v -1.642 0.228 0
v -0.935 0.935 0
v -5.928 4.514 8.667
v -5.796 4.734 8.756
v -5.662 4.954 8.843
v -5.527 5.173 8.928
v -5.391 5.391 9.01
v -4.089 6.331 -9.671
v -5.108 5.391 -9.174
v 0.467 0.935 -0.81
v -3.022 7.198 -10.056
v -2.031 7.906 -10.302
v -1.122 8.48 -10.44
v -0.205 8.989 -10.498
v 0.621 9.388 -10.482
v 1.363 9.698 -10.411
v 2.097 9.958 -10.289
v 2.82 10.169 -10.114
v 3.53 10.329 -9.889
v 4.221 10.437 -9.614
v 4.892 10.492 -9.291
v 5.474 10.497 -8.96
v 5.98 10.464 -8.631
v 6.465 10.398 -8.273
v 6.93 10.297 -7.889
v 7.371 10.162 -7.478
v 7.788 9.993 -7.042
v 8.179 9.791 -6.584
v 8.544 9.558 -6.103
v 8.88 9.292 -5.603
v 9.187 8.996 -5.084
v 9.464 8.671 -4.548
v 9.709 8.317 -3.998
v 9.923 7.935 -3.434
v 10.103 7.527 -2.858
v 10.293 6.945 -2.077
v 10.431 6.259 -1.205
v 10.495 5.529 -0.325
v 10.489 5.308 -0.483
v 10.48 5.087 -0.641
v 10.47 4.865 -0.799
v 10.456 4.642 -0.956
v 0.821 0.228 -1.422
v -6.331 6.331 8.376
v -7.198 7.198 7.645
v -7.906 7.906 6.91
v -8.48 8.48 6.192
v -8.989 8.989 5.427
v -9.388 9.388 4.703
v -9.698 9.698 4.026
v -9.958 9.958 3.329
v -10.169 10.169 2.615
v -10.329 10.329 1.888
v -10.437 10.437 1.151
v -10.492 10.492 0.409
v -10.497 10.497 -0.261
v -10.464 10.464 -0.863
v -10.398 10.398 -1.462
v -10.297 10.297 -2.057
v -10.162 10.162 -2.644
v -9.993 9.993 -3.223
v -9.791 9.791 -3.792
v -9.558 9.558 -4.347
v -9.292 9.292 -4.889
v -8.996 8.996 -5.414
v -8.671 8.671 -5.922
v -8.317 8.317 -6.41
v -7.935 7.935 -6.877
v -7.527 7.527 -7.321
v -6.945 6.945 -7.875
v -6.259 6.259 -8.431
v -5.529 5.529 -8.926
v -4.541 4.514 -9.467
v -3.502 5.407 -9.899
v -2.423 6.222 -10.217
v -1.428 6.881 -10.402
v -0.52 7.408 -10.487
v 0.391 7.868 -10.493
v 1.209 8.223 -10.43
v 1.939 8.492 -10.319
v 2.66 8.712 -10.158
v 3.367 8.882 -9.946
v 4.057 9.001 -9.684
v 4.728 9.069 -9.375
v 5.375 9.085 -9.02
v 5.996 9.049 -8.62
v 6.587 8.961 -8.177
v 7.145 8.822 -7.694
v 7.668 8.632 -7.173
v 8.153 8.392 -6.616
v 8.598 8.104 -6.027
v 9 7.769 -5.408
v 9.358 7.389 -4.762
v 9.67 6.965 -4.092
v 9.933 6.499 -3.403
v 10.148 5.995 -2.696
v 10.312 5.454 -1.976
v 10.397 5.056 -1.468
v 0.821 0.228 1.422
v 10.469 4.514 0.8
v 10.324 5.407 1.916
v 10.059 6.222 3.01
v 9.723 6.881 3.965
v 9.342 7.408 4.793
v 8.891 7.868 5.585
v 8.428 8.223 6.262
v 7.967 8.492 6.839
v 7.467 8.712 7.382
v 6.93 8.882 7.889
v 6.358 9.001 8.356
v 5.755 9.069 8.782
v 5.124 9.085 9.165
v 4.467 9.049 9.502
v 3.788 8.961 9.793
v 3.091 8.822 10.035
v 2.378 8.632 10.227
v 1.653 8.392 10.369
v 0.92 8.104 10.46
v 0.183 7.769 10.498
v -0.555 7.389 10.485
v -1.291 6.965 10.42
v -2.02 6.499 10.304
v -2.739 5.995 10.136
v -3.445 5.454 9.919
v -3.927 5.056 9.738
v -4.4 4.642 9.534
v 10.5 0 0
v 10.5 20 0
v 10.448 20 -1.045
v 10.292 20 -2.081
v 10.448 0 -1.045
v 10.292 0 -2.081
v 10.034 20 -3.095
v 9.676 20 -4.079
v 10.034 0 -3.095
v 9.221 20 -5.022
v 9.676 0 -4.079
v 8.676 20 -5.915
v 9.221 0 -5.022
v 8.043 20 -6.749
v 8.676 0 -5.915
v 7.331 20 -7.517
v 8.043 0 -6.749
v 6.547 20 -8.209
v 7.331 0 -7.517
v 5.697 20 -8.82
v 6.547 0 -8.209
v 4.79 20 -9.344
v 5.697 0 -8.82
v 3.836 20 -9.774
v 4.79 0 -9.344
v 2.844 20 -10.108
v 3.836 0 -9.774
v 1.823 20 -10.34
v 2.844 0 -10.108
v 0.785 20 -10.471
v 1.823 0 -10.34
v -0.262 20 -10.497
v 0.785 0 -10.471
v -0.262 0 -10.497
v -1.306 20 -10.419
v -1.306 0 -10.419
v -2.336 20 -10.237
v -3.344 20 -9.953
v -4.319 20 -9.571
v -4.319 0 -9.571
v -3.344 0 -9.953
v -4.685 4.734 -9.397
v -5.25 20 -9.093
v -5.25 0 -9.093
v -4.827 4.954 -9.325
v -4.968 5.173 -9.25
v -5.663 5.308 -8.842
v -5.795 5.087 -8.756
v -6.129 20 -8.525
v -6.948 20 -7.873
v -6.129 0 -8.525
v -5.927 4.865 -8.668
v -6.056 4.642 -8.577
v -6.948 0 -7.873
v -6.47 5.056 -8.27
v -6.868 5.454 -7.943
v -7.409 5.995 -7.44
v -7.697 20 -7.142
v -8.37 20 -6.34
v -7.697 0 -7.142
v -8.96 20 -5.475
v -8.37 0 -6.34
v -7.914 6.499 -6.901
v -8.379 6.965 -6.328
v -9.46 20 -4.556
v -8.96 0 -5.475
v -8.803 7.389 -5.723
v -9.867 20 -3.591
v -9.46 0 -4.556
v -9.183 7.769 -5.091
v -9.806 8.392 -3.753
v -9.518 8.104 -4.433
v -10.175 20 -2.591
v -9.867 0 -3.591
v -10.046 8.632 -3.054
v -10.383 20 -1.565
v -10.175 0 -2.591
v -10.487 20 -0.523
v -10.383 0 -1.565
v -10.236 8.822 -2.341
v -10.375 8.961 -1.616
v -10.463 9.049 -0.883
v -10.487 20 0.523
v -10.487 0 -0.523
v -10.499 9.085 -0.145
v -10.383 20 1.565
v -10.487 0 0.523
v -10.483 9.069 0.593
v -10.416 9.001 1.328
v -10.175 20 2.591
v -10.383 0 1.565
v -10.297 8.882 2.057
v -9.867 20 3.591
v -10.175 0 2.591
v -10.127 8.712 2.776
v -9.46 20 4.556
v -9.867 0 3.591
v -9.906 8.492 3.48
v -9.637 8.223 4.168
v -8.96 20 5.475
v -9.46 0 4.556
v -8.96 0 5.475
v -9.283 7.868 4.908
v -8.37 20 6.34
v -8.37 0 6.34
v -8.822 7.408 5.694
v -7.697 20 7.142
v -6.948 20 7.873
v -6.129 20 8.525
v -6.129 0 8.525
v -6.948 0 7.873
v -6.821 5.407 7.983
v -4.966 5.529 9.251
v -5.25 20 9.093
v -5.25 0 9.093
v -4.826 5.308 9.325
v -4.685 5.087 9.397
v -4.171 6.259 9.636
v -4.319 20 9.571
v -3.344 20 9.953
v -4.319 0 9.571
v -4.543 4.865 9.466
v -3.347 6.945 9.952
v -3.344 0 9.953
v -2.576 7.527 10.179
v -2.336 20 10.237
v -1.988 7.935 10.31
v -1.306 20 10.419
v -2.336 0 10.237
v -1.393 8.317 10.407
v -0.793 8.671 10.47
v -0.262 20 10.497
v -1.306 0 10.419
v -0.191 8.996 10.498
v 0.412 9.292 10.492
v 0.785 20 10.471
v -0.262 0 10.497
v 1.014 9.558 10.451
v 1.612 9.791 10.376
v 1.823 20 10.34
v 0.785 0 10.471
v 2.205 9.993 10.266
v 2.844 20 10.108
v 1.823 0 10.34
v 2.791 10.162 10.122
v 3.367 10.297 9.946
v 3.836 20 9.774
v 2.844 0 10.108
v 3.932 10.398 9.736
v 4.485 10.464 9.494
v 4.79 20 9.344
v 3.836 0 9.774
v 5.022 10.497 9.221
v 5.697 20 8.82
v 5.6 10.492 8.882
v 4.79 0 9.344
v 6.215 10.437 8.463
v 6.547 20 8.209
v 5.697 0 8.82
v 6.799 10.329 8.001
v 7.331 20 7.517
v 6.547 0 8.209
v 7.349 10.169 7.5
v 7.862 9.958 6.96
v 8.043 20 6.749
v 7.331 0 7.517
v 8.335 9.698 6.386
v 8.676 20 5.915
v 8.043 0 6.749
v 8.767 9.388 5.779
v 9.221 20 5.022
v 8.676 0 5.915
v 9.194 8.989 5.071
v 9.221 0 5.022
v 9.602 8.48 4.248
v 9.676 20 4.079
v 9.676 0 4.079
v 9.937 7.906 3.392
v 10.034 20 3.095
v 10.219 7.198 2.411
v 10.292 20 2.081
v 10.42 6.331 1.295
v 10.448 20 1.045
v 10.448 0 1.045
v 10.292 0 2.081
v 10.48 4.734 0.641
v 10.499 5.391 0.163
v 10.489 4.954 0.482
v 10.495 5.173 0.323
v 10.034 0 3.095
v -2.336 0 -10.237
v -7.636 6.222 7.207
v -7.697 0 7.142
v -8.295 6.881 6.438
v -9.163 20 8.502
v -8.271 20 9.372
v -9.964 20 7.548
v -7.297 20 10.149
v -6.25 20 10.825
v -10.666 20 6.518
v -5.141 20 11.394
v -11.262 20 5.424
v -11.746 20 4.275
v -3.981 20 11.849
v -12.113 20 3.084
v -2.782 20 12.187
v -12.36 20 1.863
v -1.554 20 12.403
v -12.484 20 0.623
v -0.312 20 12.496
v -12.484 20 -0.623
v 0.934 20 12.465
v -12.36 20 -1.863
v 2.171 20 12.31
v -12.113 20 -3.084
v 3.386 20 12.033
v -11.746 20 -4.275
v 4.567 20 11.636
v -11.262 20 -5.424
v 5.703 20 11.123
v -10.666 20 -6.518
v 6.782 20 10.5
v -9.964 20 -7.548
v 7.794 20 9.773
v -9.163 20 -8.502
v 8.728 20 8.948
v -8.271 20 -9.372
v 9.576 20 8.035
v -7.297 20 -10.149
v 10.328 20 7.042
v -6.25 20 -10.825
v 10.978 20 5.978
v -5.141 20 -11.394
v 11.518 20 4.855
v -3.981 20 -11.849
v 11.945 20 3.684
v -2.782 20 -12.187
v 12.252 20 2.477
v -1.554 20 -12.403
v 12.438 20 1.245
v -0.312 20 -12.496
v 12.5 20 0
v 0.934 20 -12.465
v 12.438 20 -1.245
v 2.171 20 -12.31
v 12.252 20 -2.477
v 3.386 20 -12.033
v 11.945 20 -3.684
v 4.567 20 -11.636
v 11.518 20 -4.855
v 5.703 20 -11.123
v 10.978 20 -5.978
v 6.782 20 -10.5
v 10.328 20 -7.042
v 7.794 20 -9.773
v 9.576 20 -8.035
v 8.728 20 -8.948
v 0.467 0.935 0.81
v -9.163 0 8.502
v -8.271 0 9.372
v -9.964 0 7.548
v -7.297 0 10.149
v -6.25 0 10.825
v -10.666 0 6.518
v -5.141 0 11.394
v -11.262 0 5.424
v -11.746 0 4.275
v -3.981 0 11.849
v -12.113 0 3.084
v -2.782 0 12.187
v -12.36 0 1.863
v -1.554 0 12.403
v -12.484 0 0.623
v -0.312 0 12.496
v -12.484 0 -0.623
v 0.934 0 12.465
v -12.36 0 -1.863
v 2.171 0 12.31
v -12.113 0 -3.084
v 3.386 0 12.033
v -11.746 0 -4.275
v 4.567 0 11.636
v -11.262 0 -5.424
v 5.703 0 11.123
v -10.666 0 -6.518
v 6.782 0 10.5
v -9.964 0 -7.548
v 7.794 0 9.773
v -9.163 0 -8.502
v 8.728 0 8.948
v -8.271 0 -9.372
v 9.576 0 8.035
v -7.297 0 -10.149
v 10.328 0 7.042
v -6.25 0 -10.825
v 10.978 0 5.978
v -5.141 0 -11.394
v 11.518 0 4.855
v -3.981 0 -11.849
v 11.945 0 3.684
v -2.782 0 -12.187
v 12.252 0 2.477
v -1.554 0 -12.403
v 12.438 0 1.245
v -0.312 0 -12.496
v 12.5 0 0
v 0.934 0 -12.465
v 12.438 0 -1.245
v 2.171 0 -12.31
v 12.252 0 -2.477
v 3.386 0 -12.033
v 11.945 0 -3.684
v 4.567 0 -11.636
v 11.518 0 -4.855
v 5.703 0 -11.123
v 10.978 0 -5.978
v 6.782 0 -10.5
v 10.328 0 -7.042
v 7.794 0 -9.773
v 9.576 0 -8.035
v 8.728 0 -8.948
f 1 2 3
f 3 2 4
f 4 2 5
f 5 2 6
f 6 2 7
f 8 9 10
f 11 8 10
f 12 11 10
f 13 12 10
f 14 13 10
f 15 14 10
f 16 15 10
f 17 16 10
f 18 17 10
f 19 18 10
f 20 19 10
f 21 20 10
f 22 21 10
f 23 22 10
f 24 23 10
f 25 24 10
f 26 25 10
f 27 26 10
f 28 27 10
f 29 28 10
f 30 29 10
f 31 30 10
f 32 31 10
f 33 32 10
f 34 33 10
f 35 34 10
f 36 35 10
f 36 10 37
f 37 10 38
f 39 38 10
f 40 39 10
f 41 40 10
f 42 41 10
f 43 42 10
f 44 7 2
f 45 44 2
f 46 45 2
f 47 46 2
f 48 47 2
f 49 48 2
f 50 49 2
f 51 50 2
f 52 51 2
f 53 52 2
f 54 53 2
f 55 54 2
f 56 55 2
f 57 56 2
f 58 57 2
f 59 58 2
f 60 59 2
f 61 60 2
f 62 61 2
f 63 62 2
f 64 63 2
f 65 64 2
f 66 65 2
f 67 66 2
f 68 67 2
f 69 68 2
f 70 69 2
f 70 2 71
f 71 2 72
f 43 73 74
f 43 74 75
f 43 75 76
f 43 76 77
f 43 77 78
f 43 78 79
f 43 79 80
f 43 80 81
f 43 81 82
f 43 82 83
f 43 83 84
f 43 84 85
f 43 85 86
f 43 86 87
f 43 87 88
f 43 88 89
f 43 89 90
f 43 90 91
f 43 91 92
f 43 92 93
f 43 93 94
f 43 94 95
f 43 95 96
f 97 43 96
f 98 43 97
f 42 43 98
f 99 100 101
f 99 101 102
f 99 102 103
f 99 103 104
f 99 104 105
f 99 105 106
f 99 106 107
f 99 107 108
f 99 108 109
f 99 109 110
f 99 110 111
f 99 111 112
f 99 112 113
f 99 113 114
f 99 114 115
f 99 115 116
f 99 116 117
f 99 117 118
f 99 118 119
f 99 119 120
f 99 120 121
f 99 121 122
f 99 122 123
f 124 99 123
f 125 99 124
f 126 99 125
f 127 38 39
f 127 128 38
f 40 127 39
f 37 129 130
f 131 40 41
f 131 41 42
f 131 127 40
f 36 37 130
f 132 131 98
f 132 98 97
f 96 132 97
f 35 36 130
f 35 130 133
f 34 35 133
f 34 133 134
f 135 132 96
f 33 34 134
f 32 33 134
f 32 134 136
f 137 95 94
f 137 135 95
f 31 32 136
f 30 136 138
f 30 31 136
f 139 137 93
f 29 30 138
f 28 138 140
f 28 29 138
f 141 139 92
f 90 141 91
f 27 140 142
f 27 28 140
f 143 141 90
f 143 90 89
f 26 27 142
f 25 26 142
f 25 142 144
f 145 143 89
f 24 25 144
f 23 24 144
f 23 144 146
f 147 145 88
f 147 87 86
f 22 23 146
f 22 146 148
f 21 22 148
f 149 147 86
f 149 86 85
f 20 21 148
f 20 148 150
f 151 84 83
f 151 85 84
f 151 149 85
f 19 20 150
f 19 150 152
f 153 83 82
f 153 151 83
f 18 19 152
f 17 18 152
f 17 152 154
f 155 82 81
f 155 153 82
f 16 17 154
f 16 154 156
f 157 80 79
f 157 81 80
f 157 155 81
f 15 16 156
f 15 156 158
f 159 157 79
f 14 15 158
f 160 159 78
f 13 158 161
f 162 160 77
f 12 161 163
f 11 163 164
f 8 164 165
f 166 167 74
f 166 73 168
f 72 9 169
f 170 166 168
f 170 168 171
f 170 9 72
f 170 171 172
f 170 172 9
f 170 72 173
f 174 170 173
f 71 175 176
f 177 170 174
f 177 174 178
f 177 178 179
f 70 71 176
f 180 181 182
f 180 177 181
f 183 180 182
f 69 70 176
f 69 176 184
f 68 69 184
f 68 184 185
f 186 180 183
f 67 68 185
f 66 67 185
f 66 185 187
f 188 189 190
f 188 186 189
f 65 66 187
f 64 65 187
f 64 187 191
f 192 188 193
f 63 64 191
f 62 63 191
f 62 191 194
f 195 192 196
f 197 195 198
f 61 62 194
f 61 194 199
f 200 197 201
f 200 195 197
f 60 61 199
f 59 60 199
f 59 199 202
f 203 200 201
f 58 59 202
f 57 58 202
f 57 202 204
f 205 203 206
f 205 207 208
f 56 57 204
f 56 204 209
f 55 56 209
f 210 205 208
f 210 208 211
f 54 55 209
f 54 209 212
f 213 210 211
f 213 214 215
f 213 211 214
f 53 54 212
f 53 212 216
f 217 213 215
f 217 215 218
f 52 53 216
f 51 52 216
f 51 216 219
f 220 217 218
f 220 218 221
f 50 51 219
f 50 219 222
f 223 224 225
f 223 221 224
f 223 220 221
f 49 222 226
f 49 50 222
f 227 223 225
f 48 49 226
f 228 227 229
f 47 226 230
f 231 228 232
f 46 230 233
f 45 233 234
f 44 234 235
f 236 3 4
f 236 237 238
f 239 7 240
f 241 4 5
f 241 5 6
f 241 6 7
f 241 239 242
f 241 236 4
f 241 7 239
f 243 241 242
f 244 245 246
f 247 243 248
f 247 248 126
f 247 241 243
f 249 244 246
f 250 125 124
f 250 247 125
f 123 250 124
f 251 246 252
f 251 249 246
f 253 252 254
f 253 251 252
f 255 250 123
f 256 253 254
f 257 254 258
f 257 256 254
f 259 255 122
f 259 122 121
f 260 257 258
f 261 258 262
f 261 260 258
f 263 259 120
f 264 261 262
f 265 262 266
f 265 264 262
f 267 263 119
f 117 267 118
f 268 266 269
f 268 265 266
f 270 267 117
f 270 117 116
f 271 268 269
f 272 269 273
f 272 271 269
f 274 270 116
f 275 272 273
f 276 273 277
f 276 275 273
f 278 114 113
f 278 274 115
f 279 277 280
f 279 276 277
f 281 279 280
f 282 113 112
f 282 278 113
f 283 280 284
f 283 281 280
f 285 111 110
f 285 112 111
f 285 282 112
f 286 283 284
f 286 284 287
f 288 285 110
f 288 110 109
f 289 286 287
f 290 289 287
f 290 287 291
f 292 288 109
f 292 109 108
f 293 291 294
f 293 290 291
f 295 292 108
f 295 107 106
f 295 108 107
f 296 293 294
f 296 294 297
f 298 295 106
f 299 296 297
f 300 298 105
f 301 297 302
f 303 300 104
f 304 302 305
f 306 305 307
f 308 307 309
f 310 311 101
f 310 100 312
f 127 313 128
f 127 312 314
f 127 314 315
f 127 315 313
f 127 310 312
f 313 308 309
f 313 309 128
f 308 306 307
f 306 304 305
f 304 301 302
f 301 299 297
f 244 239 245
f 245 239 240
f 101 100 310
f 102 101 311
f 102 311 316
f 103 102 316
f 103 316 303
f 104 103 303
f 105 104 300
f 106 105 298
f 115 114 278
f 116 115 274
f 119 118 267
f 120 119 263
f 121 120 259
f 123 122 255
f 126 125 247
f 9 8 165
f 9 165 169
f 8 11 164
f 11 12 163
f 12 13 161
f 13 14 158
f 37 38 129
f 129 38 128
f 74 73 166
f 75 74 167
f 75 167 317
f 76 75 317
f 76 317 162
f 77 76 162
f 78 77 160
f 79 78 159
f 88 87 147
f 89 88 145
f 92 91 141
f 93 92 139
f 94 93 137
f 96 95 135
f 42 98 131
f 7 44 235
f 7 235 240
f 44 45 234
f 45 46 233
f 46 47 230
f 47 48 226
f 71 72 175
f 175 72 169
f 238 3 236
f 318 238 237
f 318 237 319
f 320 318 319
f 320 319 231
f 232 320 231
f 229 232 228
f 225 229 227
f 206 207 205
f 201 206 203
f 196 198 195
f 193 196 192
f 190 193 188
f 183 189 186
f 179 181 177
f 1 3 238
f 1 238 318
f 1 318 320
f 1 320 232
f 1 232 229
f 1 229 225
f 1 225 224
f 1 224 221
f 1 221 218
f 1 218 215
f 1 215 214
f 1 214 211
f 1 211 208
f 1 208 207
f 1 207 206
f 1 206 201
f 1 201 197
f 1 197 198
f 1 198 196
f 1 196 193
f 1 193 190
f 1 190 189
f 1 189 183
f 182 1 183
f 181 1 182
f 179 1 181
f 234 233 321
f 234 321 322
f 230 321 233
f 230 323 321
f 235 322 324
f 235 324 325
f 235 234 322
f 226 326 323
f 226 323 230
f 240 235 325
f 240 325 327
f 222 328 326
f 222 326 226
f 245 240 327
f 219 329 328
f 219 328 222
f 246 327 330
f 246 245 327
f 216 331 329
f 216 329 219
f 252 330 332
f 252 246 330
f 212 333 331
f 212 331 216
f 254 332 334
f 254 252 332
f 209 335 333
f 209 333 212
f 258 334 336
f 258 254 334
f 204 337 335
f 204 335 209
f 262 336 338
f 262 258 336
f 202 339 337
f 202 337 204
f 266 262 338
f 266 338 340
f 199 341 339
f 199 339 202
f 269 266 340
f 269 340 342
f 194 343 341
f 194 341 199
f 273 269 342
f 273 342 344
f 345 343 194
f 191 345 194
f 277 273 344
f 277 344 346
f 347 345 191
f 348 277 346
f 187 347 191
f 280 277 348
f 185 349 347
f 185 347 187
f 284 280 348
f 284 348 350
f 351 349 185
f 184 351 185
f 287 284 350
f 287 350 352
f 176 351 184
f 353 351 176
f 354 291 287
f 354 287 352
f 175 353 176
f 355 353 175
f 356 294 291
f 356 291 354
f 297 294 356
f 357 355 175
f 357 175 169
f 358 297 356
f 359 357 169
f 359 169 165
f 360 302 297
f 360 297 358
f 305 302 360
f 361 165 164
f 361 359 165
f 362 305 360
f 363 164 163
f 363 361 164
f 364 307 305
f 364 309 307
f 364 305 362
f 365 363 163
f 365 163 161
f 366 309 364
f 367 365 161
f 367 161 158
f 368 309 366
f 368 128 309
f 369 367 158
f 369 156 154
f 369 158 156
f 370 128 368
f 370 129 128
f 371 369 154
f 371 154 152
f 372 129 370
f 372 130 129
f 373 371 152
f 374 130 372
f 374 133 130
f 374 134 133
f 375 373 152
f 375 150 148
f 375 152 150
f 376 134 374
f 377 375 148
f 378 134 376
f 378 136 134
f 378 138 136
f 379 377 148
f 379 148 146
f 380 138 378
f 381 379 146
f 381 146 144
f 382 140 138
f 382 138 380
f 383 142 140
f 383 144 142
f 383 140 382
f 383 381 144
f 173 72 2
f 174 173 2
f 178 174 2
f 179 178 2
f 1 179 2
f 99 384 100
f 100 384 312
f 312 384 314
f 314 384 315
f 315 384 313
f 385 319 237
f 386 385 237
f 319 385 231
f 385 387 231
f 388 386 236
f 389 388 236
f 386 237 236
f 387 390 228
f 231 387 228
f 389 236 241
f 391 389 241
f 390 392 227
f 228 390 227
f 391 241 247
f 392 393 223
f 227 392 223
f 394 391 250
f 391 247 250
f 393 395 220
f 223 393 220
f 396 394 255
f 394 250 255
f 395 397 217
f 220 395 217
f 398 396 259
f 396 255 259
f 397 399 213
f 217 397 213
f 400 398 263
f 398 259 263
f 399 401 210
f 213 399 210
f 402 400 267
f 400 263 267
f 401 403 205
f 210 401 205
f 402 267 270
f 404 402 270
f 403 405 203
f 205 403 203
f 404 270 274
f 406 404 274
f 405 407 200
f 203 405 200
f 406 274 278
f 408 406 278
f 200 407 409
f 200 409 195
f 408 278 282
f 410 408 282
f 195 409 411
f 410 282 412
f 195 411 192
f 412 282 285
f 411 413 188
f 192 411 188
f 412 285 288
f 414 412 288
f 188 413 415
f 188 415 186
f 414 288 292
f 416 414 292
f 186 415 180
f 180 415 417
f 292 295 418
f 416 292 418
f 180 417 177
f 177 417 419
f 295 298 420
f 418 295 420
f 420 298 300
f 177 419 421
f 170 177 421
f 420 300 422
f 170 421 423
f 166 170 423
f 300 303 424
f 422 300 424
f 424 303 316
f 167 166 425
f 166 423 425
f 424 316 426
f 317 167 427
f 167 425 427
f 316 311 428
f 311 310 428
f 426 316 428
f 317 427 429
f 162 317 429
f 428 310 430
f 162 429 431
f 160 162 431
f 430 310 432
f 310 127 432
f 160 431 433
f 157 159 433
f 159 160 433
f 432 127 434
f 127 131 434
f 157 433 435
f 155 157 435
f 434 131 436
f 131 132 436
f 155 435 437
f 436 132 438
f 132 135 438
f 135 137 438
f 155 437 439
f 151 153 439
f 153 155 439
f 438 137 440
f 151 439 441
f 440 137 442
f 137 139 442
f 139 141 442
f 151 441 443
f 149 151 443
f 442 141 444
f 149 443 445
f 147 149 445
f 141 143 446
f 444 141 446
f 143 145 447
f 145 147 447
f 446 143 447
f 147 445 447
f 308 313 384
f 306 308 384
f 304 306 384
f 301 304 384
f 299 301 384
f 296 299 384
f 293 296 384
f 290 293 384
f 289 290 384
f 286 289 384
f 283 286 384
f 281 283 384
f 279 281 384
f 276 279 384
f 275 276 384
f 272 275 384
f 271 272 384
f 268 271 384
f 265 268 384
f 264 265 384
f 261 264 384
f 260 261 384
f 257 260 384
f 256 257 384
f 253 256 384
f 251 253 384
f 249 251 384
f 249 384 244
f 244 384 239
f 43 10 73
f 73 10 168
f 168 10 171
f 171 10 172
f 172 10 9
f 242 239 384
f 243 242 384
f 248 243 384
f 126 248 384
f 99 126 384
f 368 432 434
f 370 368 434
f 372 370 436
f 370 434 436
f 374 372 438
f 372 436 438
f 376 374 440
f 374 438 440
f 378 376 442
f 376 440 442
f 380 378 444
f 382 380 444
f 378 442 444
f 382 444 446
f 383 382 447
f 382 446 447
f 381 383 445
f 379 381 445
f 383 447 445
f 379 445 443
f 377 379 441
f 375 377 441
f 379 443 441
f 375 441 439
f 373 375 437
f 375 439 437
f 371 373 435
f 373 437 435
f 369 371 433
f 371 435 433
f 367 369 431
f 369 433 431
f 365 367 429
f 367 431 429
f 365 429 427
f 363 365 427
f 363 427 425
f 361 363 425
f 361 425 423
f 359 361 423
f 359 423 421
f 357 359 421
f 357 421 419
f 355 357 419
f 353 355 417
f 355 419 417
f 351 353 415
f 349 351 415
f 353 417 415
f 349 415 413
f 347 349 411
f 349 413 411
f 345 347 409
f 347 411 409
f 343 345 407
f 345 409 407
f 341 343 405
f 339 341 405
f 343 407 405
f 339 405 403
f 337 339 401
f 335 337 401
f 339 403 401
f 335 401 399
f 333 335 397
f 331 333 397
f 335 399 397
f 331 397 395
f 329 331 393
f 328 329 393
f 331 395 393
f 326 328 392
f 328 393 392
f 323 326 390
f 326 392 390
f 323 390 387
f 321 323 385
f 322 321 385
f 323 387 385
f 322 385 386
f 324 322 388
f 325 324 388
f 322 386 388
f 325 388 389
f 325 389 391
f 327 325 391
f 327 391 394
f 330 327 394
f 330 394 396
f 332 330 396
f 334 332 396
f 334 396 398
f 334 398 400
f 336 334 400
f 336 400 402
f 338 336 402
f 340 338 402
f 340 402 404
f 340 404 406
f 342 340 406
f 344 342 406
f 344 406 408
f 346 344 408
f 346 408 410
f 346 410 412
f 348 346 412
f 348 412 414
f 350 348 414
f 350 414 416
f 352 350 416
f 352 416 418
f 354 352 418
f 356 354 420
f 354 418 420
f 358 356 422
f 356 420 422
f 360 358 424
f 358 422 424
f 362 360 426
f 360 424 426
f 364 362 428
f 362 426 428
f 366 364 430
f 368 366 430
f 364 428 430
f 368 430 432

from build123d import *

# Parameters (mm, degrees)
SKETCH1_R           = 12.5
SKETCH1_R_2         = 10.5
BOSS_EXTRUDE1_DEPTH = 20
BOSS_EXTRUDE2_DEPTH = 1
CIRPATTERN1_COUNT   = 3


with BuildPart() as part:
    # Sketch1 → Boss-Extrude1 (new body)
    with BuildSketch(Plane(origin=(0, 0, 0), x_dir=(1, 0, 0), z_dir=(0, 1, 0))):
        Circle(SKETCH1_R)
        Circle(SKETCH1_R_2, mode=Mode.SUBTRACT)
    extrude(amount=BOSS_EXTRUDE1_DEPTH)

    # Sketch4 → Boss-Extrude2 (add)
    with BuildSketch(Plane(origin=(0, 0, 0), x_dir=(0, 0, 1), z_dir=(0.707106781, 0.707106781, 0))):
        with BuildLine():
            Line((-9.363412571, -8.137222405), (0, -1.322062821))
            Line((0, -1.322062821), (9.559751039, -8.008067831))
            ThreePointArc((9.559751039, -8.008067831), (0.151357729, -15.865590891), (-9.363412571, -8.137222405))
        make_face()
    boss_extrude2 = extrude(amount=-BOSS_EXTRUDE2_DEPTH)

    # CirPattern1: Boss-Extrude2 ×3 about axis
    cirpattern1_axis = Axis((0, 0, 0), (0, 1, 0))
    for i in range(1, CIRPATTERN1_COUNT):
        add(boss_extrude2.rotate(cirpattern1_axis, i * 360 / CIRPATTERN1_COUNT))


solid = part.part
